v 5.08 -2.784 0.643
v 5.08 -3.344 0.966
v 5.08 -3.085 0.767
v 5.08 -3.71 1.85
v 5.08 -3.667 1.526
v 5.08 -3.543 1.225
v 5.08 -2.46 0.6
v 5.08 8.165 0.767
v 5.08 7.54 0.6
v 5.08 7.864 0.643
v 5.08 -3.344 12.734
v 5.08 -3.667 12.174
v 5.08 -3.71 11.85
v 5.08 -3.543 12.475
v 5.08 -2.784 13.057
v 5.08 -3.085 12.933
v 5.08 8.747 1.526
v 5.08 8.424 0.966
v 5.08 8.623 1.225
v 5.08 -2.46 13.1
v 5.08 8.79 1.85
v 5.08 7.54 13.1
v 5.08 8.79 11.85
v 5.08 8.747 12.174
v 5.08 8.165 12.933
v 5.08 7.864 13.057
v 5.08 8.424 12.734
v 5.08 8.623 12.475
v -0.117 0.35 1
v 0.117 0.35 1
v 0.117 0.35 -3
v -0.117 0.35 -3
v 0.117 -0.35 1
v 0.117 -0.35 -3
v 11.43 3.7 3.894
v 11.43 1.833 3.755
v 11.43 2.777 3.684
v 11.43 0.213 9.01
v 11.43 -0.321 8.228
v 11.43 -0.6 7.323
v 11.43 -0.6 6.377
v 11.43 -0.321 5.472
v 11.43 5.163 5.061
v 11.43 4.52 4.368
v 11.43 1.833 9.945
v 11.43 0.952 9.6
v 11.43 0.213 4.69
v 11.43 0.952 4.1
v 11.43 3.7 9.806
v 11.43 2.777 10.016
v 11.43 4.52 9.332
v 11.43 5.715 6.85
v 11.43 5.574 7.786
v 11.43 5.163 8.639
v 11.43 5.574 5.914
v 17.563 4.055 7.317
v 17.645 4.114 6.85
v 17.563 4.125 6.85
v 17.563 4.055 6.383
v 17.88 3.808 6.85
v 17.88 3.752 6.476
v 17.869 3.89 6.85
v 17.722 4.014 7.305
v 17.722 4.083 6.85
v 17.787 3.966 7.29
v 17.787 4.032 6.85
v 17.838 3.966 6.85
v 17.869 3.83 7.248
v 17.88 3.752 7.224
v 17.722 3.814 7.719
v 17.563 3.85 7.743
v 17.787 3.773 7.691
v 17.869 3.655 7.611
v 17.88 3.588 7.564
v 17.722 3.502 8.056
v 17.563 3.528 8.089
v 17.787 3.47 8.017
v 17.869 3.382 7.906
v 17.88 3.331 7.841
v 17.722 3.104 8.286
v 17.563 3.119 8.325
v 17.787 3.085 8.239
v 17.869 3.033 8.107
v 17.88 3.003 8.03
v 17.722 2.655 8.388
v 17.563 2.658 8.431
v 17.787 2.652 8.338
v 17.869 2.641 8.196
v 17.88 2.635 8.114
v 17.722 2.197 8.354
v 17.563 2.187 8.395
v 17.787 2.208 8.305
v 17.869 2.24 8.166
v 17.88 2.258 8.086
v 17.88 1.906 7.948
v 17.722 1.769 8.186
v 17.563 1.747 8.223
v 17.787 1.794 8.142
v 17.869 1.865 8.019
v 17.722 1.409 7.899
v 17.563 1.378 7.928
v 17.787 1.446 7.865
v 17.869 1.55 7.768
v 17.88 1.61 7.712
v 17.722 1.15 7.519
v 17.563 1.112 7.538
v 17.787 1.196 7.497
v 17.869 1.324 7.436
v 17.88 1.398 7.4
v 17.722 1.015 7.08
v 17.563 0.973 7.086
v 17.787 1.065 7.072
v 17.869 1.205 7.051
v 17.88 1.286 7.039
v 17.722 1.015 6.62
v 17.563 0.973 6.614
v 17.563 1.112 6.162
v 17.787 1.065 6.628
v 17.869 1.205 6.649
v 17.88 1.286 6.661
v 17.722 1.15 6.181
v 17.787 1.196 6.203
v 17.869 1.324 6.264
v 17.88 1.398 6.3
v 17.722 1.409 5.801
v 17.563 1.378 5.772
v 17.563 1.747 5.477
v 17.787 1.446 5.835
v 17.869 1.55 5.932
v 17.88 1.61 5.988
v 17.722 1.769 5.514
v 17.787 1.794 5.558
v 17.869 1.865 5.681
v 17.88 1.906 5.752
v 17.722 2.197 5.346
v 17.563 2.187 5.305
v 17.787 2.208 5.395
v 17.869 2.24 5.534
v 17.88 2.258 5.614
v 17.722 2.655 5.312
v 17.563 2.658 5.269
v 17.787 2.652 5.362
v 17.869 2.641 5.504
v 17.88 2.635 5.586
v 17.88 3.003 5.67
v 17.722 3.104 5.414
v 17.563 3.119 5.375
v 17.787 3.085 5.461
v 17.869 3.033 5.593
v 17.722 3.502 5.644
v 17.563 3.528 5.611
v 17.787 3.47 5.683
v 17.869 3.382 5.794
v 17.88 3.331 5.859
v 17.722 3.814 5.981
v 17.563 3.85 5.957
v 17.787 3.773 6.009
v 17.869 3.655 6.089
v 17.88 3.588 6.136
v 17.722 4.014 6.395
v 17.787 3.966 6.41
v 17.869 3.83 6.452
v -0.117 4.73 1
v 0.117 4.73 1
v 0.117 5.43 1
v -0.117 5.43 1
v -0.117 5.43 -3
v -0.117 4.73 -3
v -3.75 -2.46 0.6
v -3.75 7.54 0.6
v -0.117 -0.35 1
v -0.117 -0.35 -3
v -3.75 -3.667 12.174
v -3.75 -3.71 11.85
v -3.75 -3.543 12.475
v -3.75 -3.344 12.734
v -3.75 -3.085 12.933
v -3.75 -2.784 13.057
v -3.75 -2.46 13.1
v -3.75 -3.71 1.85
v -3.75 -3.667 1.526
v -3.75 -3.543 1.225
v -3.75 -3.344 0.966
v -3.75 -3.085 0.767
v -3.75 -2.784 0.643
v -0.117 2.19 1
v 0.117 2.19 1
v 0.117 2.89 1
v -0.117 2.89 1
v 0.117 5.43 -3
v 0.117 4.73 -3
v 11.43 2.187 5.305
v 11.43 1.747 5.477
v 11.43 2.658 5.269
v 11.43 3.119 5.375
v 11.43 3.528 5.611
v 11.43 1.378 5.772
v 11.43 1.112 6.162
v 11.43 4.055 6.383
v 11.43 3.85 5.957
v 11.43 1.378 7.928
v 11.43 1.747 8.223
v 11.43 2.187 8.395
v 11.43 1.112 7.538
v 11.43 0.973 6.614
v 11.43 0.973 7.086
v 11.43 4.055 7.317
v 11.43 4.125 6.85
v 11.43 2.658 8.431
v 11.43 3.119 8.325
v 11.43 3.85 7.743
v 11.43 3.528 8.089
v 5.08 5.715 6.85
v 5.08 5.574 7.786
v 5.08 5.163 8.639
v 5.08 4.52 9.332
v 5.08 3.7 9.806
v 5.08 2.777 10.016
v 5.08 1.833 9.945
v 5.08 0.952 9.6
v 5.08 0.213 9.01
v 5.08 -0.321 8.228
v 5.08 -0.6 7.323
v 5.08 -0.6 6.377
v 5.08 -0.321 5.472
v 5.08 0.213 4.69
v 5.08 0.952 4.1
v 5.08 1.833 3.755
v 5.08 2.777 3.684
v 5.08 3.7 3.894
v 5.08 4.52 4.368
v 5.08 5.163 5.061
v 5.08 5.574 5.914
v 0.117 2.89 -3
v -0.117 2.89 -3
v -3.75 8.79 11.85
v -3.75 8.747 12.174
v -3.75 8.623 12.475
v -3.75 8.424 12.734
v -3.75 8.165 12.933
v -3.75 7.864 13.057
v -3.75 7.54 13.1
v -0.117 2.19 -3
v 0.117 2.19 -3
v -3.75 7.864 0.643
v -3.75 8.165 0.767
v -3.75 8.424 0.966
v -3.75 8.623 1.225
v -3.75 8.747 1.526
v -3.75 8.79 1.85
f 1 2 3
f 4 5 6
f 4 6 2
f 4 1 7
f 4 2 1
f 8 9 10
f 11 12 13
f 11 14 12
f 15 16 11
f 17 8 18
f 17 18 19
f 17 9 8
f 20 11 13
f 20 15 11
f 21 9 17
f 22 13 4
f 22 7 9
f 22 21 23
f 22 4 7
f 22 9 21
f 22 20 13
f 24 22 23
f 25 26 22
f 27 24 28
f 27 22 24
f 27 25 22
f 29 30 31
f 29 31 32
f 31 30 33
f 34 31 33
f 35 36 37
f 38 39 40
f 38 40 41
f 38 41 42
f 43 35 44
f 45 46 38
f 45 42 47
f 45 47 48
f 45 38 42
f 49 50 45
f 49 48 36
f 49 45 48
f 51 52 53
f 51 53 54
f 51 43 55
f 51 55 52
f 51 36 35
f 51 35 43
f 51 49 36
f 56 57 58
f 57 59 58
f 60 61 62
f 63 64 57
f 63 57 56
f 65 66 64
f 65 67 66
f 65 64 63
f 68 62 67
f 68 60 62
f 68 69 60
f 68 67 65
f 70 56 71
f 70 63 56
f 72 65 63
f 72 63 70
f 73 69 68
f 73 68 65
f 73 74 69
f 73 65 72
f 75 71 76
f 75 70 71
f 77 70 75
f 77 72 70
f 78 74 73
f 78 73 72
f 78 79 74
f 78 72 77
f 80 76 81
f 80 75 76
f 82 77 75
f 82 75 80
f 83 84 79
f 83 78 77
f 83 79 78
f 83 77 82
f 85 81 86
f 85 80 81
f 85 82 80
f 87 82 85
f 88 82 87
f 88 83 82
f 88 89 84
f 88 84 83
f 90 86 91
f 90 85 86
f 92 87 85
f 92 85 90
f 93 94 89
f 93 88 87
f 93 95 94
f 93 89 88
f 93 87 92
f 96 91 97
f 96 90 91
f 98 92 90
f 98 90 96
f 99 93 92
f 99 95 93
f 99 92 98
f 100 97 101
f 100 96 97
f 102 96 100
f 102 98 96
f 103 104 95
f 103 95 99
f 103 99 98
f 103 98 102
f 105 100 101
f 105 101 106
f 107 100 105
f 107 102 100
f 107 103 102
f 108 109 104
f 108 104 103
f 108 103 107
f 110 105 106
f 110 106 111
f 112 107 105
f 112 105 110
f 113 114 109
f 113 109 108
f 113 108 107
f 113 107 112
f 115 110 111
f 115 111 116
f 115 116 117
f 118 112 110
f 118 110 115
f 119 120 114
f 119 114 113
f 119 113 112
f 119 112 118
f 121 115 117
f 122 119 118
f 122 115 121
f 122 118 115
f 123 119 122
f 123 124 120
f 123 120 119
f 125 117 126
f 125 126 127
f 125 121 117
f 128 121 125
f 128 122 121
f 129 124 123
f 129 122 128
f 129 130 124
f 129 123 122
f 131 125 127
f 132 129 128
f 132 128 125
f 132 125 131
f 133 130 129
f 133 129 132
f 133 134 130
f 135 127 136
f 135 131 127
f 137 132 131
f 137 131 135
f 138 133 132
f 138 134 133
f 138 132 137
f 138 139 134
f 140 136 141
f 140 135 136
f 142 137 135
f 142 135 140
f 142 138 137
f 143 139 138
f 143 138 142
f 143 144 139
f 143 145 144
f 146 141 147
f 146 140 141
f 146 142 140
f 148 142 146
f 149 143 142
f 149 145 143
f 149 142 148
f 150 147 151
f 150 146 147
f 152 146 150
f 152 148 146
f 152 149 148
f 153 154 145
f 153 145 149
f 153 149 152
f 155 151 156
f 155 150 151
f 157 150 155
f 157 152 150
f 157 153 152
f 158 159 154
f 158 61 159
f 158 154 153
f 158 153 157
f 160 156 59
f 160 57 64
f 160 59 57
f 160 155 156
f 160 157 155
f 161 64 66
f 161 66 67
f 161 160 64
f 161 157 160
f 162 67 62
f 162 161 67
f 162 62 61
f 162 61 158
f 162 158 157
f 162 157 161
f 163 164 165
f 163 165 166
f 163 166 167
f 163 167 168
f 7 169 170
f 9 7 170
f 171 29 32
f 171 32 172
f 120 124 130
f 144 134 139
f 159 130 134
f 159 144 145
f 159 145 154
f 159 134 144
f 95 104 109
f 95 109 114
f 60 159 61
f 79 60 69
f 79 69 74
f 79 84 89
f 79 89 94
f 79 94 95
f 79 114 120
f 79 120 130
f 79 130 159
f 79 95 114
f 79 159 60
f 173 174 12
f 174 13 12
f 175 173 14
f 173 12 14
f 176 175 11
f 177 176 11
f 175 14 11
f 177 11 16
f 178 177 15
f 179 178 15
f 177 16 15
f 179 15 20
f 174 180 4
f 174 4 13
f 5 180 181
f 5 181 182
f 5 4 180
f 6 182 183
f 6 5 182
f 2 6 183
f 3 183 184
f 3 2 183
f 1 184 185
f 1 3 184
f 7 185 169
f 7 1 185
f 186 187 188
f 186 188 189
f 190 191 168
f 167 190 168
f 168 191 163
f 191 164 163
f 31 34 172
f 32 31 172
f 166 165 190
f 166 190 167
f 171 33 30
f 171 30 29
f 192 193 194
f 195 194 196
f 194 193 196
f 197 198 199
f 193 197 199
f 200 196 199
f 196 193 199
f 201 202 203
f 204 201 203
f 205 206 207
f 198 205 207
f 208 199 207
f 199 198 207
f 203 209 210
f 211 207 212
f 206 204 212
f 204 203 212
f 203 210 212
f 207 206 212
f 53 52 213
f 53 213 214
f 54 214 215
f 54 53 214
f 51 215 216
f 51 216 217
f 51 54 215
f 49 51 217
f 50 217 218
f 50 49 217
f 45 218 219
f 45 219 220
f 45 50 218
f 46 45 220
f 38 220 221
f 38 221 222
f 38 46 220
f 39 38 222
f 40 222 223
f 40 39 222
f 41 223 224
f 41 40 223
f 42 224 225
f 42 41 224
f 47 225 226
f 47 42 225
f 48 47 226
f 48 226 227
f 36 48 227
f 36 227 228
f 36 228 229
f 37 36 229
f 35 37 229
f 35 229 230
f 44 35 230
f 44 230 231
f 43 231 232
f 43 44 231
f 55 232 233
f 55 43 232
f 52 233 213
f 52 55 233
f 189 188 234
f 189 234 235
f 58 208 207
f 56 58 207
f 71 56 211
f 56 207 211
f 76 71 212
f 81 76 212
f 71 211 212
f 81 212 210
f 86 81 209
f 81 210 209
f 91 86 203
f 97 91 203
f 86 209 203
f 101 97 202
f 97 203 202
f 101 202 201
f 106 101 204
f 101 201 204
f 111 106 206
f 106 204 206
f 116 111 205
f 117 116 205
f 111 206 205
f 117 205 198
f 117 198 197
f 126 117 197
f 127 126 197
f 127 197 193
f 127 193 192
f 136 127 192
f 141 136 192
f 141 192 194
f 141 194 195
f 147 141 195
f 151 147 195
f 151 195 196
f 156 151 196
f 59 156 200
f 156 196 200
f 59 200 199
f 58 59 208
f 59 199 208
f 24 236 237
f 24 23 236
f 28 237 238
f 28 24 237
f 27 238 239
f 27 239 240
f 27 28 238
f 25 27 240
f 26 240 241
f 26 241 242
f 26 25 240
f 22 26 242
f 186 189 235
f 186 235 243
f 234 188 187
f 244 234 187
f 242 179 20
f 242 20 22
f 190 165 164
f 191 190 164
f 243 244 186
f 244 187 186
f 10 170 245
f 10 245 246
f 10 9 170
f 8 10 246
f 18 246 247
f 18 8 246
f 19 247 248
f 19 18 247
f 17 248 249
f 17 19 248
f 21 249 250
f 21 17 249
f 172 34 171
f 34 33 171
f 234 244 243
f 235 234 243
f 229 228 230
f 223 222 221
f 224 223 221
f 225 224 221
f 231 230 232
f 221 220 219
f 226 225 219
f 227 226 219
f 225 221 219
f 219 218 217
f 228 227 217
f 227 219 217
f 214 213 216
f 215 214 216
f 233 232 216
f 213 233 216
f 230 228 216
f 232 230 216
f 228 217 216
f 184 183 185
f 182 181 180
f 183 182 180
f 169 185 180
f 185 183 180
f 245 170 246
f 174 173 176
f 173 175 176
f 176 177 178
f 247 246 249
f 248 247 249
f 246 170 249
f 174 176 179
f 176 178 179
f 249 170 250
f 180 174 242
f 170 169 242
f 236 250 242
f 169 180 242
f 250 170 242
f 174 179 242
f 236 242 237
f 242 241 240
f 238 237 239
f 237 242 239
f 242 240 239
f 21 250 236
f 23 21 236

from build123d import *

# Parameters (mm, degrees)
SKETCH001_R       = 3.175
PAD001_DEPTH      = 6.35
SKETCH003_W       = 0.233334
SKETCH003_H       = 0.7
PAD002_DEPTH      = 1
PAD002_DEPTH_BACK = 3
SKETCH004_R       = 1.585
PAD003_DEPTH      = 6.45
FILLET_R          = 0.317
SKETCH_W          = 12.5
SKETCH_H          = 12.5
PAD_DEPTH         = 8.83
FILLET001_R       = 1.25


with BuildPart() as pad001:
    # Sketch001 → Pad001 (new body)
    with BuildSketch(Plane.YZ.offset(11.43)):
        with Locations((2.54, 6.85)):
            Circle(SKETCH001_R)
    extrude(amount=-PAD001_DEPTH)


with BuildPart() as pad002:
    # Sketch003 → Pad002 (new body, two sides)
    with BuildSketch(Plane(origin=(0, 0, 0), x_dir=(-1, 0, 0), z_dir=(0, 0, 1))) as pad002_sk:
        Rectangle(SKETCH003_W, SKETCH003_H)
        with Locations((0, -2.54)):
            Rectangle(SKETCH003_W, SKETCH003_H)
        with Locations((0, -5.08)):
            Rectangle(SKETCH003_W, SKETCH003_H)
    extrude(amount=PAD002_DEPTH)
    extrude(pad002_sk.sketch, amount=-PAD002_DEPTH_BACK)


with BuildPart() as fillet_body:
    # Sketch004 → Pad003 (new body)
    with BuildSketch(Plane.YZ.offset(11.43)):
        with Locations((2.54, 6.85)):
            Circle(SKETCH004_R)
    extrude(amount=PAD003_DEPTH)

    # Fillet
    fillet_edges = [fillet_body.edges().sort_by_distance(p)[0] for p in [
        (17.88, 0.955, 6.85),
    ]]
    fillet(fillet_edges, radius=FILLET_R)


with BuildPart() as fillet001:
    # Sketch → Pad (new body)
    with BuildSketch(Plane.YZ.offset(-3.75)):
        with Locations((2.54, 6.85)):
            Rectangle(SKETCH_W, SKETCH_H)
    extrude(amount=PAD_DEPTH)

    # Fillet001
    fillet001_edges = [fillet001.edges().sort_by_distance(p)[0] for p in [
        (0.665, -3.71, 13.1),
        (0.665, 8.79, 13.1),
        (0.665, -3.71, 0.6),
        (0.665, 8.79, 0.6),
    ]]
    fillet(fillet001_edges, radius=FILLET001_R)


solid = Compound([pad001.part, pad002.part, fillet_body.part, fillet001.part])
